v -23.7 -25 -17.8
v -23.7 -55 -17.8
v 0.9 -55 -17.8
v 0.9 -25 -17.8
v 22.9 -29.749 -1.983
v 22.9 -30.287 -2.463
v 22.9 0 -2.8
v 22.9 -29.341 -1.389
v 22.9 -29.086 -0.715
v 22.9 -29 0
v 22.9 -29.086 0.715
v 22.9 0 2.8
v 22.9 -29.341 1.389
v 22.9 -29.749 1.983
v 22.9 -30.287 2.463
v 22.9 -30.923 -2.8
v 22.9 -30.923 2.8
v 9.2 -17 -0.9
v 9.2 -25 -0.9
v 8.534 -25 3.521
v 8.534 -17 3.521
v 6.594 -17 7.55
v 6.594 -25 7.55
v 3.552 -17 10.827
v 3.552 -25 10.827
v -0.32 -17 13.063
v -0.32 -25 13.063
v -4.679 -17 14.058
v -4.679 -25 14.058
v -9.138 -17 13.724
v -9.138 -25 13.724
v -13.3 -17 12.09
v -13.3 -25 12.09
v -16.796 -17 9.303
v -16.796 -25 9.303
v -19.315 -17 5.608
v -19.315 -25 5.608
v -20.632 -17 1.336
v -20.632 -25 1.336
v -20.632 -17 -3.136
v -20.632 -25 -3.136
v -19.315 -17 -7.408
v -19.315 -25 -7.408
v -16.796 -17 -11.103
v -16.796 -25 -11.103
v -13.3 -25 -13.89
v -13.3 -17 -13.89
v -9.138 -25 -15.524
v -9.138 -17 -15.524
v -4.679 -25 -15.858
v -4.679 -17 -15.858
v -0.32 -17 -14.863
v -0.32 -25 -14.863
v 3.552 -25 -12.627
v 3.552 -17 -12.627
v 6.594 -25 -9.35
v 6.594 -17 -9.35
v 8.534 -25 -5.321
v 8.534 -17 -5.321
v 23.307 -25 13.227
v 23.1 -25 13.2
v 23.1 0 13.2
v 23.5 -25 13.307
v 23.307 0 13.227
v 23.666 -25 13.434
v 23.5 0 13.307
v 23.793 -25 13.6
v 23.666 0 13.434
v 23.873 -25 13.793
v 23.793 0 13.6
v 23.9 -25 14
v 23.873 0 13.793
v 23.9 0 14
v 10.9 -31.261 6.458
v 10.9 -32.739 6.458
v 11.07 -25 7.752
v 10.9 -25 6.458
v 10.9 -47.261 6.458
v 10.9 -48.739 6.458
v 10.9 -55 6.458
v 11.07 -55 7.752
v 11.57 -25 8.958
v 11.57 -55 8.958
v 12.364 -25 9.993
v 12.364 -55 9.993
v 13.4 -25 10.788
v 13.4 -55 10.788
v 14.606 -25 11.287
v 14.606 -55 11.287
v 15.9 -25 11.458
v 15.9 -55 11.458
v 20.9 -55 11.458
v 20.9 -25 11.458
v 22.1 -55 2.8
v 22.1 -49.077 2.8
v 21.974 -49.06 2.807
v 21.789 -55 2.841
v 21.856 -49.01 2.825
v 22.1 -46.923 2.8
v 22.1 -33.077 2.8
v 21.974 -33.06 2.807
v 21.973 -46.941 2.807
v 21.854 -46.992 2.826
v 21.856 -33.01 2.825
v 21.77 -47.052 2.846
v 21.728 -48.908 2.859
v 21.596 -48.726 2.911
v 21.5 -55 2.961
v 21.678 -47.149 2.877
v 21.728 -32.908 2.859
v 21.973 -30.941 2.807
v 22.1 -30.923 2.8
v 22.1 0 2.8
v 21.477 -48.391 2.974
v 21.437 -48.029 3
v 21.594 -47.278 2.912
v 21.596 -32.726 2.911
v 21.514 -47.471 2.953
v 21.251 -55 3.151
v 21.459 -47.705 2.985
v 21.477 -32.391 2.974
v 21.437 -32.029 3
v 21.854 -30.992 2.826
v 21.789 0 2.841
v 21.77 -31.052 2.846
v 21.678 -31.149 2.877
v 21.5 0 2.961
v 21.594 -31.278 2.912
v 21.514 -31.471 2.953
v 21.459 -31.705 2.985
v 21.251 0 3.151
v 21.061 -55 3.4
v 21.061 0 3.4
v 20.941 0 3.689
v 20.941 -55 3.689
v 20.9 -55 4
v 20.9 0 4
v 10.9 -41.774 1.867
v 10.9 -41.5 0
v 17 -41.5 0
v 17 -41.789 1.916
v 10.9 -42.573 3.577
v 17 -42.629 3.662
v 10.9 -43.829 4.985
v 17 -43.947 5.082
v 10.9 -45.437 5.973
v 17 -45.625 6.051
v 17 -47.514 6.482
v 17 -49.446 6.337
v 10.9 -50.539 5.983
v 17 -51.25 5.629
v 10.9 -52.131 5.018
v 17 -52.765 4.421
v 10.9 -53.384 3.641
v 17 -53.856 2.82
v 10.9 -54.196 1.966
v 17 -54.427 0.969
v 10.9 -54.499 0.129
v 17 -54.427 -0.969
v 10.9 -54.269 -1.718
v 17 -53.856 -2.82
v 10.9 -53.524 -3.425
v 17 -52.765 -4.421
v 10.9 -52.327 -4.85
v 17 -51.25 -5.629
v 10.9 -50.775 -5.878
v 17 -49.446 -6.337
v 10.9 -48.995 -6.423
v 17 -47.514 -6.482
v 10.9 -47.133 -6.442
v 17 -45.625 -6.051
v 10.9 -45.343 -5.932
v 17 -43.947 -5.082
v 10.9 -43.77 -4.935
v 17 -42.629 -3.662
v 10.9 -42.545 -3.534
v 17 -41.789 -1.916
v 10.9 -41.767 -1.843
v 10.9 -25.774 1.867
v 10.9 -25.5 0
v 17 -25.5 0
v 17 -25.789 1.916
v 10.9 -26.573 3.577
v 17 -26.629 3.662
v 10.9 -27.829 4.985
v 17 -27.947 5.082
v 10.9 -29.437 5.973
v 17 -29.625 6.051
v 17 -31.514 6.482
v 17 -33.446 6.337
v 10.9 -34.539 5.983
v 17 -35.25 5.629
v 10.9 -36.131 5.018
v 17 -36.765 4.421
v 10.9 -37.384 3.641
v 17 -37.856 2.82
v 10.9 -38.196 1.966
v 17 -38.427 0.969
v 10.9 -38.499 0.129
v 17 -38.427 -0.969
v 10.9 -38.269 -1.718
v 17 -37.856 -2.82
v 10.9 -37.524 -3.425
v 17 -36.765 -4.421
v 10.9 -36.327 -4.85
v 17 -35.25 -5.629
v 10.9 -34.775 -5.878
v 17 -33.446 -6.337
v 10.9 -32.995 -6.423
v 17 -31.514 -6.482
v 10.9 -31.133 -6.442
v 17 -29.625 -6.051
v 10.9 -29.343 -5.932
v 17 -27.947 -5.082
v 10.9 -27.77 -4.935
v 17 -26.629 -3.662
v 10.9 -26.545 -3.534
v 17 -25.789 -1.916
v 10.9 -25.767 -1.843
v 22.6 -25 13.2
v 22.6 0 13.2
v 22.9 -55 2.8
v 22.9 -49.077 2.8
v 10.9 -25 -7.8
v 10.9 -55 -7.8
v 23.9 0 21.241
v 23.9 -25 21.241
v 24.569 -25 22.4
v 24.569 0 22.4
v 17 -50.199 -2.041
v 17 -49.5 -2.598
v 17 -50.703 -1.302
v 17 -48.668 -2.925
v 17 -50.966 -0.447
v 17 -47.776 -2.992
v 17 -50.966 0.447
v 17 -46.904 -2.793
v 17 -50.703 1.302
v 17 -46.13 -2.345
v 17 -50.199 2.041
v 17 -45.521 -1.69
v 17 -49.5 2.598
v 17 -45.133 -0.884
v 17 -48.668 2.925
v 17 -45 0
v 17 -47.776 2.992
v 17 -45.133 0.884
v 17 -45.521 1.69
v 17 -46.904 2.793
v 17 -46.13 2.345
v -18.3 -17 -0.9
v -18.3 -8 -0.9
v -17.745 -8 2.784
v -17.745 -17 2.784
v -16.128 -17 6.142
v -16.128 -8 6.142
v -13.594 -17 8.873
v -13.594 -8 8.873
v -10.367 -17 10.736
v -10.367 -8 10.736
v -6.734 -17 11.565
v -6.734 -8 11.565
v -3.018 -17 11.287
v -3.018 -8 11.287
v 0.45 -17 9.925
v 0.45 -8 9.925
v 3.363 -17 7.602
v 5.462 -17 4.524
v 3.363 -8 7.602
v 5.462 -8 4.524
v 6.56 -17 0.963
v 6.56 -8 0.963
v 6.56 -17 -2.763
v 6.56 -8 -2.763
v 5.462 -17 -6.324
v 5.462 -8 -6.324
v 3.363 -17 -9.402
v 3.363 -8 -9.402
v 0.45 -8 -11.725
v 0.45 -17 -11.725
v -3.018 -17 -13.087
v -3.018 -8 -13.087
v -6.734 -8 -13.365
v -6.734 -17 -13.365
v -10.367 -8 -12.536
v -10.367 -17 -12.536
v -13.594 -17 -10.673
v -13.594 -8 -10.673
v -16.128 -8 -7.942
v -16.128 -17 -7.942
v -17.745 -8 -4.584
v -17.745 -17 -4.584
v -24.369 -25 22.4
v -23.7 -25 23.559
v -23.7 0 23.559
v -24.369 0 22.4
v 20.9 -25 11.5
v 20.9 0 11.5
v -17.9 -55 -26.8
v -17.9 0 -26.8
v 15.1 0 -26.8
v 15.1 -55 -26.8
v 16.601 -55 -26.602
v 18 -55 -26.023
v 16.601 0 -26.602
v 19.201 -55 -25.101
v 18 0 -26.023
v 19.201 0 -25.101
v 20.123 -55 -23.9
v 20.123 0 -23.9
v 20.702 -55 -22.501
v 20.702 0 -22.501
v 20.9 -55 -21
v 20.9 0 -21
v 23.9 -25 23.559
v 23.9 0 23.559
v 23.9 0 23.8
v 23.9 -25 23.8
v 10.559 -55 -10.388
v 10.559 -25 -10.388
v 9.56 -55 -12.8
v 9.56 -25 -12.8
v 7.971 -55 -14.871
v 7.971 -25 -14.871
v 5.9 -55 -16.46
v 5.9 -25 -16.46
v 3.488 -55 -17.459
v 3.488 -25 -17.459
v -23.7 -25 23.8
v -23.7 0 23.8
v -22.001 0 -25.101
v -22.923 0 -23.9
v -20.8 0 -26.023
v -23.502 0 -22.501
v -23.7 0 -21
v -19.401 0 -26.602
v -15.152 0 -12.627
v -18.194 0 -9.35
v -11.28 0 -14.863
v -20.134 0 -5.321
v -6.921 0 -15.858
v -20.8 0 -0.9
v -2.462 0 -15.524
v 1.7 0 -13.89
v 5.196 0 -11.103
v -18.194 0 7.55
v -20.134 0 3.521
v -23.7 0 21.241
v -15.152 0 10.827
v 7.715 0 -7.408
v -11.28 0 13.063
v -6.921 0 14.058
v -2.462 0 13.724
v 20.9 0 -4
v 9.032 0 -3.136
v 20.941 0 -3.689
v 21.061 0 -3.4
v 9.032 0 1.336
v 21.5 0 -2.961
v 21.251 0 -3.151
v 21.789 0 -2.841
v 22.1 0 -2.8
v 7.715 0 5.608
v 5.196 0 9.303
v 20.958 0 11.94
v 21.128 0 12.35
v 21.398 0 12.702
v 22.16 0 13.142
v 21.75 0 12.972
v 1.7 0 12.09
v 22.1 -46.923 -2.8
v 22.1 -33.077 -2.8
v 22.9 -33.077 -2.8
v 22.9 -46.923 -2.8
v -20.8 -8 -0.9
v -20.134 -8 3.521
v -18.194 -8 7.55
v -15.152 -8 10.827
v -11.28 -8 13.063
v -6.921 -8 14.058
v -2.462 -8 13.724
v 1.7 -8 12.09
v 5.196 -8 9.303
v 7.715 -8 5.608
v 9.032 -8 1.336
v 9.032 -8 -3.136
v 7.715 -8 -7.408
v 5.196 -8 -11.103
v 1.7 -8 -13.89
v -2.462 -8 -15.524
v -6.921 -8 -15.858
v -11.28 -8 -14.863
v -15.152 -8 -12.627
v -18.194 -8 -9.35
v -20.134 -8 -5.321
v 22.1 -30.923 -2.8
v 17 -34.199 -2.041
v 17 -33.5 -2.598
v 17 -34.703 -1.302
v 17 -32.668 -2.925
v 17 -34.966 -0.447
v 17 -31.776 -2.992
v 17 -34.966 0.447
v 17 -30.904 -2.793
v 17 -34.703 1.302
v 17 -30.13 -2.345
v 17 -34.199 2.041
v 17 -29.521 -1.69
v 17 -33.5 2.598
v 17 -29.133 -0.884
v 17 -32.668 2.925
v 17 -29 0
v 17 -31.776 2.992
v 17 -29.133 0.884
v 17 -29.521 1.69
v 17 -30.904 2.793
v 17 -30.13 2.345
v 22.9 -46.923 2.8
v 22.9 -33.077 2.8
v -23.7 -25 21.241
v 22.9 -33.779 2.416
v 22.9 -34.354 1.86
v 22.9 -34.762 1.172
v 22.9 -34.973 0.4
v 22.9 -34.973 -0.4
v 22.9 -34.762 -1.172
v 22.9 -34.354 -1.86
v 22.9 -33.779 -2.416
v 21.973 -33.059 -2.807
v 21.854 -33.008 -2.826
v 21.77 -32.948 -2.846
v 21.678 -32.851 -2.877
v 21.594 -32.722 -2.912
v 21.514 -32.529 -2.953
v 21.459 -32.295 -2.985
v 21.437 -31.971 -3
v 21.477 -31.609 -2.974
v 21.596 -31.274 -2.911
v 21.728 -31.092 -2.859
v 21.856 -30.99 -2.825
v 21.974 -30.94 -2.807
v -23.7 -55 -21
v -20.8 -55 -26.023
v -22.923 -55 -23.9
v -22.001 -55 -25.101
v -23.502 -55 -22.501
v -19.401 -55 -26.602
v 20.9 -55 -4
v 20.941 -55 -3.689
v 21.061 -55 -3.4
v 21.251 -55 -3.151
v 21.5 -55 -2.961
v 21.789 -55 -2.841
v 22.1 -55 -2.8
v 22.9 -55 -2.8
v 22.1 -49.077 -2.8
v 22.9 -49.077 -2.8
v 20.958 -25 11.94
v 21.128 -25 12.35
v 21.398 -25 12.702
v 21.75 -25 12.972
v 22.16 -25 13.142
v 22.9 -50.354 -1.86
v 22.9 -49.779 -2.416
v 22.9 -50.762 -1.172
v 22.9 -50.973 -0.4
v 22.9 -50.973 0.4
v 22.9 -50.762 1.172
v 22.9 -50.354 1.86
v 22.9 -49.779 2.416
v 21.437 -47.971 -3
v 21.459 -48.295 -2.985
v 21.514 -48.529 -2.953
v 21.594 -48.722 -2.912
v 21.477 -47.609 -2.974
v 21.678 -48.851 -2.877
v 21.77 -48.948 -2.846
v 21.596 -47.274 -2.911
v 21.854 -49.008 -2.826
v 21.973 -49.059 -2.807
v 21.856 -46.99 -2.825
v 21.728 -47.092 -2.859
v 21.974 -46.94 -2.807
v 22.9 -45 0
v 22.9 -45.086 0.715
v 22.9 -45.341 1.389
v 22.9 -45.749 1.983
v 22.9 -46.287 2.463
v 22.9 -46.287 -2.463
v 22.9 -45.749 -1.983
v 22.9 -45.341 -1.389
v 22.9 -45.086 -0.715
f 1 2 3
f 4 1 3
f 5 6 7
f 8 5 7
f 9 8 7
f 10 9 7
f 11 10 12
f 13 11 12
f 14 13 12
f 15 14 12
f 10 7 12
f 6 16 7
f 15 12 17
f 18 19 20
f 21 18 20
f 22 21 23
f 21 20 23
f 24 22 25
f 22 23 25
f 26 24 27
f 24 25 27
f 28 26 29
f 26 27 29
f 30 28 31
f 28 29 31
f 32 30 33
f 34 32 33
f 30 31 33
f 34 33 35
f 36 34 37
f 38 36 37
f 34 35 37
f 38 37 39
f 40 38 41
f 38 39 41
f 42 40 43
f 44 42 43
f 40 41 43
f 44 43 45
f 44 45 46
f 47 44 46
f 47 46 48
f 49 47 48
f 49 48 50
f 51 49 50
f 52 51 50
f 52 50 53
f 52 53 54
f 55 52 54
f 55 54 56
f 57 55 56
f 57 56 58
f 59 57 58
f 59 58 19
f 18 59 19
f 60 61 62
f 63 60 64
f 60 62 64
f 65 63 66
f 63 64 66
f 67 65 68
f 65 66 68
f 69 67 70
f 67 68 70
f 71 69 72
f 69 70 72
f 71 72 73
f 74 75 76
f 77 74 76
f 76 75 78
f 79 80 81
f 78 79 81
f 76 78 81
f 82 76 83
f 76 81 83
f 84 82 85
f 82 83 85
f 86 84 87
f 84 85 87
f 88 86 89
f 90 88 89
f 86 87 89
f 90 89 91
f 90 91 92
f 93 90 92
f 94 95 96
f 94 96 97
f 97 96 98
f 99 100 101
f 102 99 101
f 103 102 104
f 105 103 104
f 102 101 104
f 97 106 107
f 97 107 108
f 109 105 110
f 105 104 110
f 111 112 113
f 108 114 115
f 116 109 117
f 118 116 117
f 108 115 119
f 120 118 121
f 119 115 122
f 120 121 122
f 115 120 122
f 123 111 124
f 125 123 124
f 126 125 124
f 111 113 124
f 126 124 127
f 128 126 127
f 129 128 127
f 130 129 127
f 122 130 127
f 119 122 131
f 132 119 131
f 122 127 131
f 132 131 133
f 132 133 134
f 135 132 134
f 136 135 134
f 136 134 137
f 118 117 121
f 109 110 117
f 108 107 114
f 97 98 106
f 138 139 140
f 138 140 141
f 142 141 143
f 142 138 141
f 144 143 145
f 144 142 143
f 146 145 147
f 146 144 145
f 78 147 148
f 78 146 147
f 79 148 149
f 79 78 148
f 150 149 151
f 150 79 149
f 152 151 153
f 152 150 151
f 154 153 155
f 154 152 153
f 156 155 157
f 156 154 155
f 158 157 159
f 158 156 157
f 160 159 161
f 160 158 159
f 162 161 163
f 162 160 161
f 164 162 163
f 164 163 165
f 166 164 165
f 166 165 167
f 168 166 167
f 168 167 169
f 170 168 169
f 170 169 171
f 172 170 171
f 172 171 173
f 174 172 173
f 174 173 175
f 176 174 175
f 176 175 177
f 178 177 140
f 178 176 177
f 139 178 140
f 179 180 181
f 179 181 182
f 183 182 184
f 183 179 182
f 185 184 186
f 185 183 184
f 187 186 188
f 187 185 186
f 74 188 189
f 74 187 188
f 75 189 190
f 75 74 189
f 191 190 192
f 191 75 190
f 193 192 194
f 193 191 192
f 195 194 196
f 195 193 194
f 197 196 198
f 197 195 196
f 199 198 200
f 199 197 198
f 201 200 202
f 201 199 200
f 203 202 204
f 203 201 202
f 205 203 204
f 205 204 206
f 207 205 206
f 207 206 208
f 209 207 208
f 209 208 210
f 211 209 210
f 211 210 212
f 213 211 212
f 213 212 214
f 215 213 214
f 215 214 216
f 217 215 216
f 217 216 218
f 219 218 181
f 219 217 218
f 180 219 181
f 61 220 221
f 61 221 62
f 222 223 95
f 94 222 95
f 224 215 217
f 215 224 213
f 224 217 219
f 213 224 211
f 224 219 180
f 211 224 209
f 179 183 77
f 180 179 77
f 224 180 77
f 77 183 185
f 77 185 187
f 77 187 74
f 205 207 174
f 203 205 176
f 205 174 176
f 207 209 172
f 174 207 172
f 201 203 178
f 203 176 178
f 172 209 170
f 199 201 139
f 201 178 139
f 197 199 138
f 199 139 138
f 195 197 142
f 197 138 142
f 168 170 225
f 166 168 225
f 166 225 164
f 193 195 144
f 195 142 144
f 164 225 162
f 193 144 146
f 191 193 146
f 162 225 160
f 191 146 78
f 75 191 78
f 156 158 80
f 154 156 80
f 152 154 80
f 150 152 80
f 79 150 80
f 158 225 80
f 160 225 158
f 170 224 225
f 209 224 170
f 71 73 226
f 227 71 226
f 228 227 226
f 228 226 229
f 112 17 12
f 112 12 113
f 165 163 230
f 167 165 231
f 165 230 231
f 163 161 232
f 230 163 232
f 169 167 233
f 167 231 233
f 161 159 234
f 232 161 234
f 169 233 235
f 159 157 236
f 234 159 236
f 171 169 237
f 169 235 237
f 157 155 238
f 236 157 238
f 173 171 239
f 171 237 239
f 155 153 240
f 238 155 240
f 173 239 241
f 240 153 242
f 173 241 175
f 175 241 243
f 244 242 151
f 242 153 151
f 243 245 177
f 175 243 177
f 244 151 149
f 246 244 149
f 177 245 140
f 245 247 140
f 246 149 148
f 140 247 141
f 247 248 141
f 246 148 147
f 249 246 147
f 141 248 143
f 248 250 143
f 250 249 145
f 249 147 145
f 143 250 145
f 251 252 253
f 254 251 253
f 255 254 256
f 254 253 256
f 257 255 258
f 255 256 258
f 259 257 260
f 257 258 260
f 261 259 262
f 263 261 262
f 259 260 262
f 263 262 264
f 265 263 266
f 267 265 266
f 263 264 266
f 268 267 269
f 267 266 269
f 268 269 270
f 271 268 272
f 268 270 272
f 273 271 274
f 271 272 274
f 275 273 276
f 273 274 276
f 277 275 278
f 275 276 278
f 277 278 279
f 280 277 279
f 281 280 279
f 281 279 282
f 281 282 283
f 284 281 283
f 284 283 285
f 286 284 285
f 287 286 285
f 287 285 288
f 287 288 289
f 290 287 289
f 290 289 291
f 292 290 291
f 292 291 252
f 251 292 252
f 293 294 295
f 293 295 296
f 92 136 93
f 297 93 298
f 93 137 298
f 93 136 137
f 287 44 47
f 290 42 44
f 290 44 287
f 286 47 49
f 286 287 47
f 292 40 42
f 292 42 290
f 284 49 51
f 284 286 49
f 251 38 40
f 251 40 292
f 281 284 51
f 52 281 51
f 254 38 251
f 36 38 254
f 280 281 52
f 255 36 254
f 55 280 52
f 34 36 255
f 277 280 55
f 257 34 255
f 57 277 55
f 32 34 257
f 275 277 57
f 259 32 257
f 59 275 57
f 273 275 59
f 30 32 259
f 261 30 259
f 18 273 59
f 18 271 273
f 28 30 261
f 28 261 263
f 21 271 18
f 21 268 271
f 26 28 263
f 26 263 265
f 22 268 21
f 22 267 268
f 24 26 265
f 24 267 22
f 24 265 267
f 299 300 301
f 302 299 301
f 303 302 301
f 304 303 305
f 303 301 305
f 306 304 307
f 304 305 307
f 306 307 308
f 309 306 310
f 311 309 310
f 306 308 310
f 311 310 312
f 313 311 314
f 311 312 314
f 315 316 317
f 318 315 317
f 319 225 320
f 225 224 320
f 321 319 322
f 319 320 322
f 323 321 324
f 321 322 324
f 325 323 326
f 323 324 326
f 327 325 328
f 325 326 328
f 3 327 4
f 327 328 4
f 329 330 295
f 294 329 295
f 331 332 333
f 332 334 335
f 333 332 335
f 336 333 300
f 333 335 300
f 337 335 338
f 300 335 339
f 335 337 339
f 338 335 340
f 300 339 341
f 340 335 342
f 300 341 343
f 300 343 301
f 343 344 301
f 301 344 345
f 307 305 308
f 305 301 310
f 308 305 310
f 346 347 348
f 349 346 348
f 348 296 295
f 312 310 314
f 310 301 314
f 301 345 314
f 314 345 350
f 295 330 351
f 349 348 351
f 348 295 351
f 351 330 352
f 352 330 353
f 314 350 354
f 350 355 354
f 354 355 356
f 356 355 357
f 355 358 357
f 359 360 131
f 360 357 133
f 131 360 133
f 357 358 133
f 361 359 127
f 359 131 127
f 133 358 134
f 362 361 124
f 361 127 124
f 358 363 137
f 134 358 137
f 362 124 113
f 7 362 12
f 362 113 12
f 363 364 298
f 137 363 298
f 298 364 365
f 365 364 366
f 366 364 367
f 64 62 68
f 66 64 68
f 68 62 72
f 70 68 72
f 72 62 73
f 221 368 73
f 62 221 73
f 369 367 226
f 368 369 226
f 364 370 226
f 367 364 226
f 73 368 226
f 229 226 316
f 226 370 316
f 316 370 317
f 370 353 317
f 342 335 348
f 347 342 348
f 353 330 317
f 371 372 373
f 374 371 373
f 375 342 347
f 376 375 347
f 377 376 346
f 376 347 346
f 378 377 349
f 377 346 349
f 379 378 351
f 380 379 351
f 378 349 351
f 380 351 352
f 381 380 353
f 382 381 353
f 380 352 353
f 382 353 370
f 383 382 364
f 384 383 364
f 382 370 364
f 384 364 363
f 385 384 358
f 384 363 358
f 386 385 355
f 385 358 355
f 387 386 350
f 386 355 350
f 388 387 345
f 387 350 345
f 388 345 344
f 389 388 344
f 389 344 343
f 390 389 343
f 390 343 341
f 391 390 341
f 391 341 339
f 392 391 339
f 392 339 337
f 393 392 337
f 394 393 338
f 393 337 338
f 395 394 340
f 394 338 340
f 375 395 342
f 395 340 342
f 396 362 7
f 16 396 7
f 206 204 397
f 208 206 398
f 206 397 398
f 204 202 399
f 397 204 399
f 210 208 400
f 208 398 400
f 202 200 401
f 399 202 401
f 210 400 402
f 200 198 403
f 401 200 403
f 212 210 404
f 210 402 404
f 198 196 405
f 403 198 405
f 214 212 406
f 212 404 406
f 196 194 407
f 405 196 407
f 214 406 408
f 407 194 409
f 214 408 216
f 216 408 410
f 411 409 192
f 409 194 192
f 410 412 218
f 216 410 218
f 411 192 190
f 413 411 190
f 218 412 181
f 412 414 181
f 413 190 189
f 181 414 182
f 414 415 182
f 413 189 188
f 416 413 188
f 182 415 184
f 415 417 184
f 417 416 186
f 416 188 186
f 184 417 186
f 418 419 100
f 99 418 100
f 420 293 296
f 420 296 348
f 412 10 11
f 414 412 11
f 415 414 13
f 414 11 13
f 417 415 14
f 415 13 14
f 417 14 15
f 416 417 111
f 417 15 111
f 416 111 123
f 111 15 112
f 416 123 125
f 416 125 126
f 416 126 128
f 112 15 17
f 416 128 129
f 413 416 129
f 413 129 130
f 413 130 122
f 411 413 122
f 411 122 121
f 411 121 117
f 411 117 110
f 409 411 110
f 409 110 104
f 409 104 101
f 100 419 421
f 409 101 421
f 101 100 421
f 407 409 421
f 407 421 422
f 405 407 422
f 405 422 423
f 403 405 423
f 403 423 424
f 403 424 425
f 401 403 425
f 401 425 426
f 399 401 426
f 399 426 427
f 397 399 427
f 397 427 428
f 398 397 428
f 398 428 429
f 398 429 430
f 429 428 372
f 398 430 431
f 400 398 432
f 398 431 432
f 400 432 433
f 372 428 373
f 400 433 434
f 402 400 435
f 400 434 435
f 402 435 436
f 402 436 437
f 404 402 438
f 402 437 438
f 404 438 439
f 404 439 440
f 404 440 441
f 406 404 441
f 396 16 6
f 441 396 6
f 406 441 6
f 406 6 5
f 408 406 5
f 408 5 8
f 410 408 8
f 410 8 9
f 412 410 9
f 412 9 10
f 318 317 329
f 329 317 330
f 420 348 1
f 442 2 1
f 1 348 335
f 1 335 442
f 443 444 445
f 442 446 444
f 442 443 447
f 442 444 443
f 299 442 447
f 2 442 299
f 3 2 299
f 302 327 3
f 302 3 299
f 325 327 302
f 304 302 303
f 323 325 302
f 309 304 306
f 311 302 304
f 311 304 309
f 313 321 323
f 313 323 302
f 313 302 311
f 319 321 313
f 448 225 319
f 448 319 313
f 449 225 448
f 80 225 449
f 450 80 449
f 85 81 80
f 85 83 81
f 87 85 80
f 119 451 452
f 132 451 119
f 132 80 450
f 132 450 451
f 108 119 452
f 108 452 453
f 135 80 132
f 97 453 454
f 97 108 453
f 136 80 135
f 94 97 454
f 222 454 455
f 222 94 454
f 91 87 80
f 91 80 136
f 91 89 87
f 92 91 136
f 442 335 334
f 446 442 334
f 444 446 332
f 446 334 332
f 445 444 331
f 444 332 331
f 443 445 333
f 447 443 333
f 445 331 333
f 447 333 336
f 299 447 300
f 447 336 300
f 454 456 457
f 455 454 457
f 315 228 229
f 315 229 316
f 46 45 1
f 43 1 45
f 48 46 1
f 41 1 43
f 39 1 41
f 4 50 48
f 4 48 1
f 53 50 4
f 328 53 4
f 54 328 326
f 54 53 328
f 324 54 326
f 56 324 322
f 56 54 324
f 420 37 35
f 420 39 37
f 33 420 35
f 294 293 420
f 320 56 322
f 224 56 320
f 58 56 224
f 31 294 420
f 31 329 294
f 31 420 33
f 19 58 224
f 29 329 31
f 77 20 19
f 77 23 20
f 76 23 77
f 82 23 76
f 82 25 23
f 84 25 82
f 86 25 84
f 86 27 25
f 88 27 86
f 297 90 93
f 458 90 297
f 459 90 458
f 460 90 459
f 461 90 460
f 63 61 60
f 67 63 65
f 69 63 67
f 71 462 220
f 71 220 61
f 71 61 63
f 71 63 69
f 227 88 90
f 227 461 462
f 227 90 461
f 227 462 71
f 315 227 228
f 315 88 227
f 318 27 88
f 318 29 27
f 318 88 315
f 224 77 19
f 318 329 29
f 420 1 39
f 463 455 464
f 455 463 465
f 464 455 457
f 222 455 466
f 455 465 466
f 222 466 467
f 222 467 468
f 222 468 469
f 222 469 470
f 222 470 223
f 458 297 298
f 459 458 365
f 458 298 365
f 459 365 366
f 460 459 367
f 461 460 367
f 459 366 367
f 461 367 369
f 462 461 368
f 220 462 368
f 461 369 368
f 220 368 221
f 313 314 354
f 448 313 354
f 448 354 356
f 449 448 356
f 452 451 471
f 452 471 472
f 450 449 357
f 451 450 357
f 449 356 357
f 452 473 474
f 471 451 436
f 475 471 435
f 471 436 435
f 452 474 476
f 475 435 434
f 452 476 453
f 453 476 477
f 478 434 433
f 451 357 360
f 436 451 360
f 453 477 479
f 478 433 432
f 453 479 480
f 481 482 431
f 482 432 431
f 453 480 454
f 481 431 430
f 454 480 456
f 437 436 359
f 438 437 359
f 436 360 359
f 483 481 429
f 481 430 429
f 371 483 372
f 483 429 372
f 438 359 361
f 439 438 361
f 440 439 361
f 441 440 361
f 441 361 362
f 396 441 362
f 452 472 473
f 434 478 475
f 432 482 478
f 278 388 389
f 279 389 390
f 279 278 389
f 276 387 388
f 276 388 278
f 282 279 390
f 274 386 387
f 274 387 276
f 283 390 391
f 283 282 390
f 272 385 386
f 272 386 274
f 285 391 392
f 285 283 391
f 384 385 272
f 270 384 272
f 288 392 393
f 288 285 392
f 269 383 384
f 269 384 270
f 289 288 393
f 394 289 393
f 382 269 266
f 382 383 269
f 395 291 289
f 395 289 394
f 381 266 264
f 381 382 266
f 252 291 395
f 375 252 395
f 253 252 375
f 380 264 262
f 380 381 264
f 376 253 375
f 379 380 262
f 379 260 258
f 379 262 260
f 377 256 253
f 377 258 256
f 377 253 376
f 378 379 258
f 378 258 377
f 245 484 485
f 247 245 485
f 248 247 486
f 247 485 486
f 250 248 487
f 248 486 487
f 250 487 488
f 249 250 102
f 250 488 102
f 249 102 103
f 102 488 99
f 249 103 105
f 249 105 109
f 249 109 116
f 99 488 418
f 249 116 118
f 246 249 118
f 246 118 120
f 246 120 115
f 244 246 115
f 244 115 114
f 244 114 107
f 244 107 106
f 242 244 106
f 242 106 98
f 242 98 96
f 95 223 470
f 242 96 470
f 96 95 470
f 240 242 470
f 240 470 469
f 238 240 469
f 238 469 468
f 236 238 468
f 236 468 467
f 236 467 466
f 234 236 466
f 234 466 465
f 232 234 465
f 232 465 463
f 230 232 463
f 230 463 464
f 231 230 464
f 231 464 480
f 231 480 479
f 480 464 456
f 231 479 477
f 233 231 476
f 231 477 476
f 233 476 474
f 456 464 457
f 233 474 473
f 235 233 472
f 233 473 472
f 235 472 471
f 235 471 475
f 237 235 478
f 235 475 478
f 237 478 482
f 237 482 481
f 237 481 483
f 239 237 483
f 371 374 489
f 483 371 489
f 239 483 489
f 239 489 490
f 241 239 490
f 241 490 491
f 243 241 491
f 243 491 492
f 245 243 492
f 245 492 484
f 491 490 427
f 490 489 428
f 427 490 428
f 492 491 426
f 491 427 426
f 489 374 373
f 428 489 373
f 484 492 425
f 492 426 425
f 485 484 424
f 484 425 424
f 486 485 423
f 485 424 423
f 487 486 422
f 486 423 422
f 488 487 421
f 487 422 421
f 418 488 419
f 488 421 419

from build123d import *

# Parameters (mm, degrees)
F1_DEPTH  = 55
F3_DEPTH  = 30
F4_R      = 3
F5_DEPTH  = 25
F6_R      = 12.5
F7_DEPTH  = 25
F8_R      = 15
F9_DEPTH  = 38
F10_R     = 15
F11_DEPTH = 8
F12_R     = 6.5
F13_DEPTH = 17
F14_R     = 10


with BuildPart() as f1:
    # F0 (on Front) → F1 (new body)
    with BuildSketch(Plane.XZ):
        with BuildLine():
            Line((-23.699999, 23.799999), (-23.699999, 23.558845))
            Line((-23.699999, 23.558845), (-24.369059, 22.399999))
            Line((-24.369059, 22.399999), (-23.699999, 21.241153))
            Line((-23.699999, 21.241153), (-23.699999, -21.000001))
            ThreePointArc((-23.699999, -21.000001), (-22.001218, -25.10122), (-17.899999, -26.8))
            Line((-17.899999, -26.8), (15.100001, -26.8))
            ThreePointArc((15.100001, -26.8), (19.20122, -25.10122), (20.9, -21.000001))
            Line((20.9, -21.000001), (20.9, -4.000001))
            ThreePointArc((20.9, -4.000001), (21.251472, -3.151472), (22.100001, -2.8))
            Line((22.100001, -2.8), (22.9, -2.8))
            Line((22.9, -2.8), (22.9, 2.799999))
            Line((22.9, 2.799999), (22.100001, 2.799999))
            ThreePointArc((22.100001, 2.799999), (21.251472, 3.151471), (20.9, 3.999999))
            Line((20.9, 3.999999), (20.9, 11.499999))
            ThreePointArc((20.9, 11.499999), (21.397919, 12.702081), (22.600001, 13.2))
            Line((22.600001, 13.2), (23.100001, 13.2))
            ThreePointArc((23.100001, 13.2), (23.665686, 13.434314), (23.9, 13.999999))
            Line((23.9, 13.999999), (23.9, 21.241153))
            Line((23.9, 21.241153), (24.56906, 22.399999))
            Line((24.56906, 22.399999), (23.9, 23.558845))
            Line((23.9, 23.558845), (23.9, 23.799999))
            Line((23.9, 23.799999), (-23.699999, 23.799999))
        make_face()
    extrude(amount=F1_DEPTH)

    # F2 (on face) → F3 (cut)
    with BuildSketch(Plane.XZ.offset(55)):
        with BuildLine():
            Line((15.9, 11.457851), (26.682628, 11.457851))
            Line((26.682628, 11.457851), (26.682628, 26.709846))
            Line((26.682628, 26.709846), (-26.825872, 26.709846))
            Line((-26.825872, 26.709846), (-26.825872, -17.8))
            Line((-26.825872, -17.8), (5.9, -17.8))
            Line((5.9, -17.8), (10.9, -17.8))
            Line((10.9, -17.8), (10.9, -11.8))
            Line((10.9, -11.8), (10.9, 6.457851))
            ThreePointArc((10.9, 6.457851), (12.364466, 9.993385), (15.9, 11.457851))
        make_face()
    extrude(amount=-F3_DEPTH, mode=Mode.SUBTRACT)

    # F4 (on face) → F5 (cut)
    with BuildSketch(Plane.YZ.offset(22.9)):
        with Locations((-48, -1e-06)):
            Circle(F4_R)
        with Locations((-32, -1e-06)):
            Circle(F4_R)
    extrude(amount=-F5_DEPTH, mode=Mode.SUBTRACT)

    # F6 (on face) → F7 (cut, through all)
    with BuildSketch(Plane(origin=(0, 0, 0), x_dir=(-1, 0, 0), z_dir=(0, 1, 0))):
        with Locations((5.799999, -0.9)):
            Circle(F6_R)
    extrude(amount=-F7_DEPTH, mode=Mode.SUBTRACT)

    # F8 (on face) → F9 (cut)
    with BuildSketch(Plane.XZ.offset(55)):
        with Locations((-5.799999, -0.9)):
            Circle(F8_R)
    extrude(amount=-F9_DEPTH, mode=Mode.SUBTRACT)

    # F10 (on face) → F11 (cut)
    with BuildSketch(Plane(origin=(0, 0, 0), x_dir=(-1, 0, 0), z_dir=(0, 1, 0))):
        with Locations((5.799999, -0.9)):
            Circle(F10_R)
    extrude(amount=-F11_DEPTH, mode=Mode.SUBTRACT)

    # F12 (on Right) → F13 (cut)
    with BuildSketch(Plane.YZ):
        with Locations((-32, 0)):
            Circle(F12_R)
        with Locations((-48, 0)):
            Circle(F12_R)
    extrude(amount=F13_DEPTH, mode=Mode.SUBTRACT)

    # F14
    f14_edges = [f1.edges().sort_by_distance(p)[0] for p in [
        (10.9, -40, -17.8),
    ]]
    fillet(f14_edges, radius=F14_R)


solid = f1.part
